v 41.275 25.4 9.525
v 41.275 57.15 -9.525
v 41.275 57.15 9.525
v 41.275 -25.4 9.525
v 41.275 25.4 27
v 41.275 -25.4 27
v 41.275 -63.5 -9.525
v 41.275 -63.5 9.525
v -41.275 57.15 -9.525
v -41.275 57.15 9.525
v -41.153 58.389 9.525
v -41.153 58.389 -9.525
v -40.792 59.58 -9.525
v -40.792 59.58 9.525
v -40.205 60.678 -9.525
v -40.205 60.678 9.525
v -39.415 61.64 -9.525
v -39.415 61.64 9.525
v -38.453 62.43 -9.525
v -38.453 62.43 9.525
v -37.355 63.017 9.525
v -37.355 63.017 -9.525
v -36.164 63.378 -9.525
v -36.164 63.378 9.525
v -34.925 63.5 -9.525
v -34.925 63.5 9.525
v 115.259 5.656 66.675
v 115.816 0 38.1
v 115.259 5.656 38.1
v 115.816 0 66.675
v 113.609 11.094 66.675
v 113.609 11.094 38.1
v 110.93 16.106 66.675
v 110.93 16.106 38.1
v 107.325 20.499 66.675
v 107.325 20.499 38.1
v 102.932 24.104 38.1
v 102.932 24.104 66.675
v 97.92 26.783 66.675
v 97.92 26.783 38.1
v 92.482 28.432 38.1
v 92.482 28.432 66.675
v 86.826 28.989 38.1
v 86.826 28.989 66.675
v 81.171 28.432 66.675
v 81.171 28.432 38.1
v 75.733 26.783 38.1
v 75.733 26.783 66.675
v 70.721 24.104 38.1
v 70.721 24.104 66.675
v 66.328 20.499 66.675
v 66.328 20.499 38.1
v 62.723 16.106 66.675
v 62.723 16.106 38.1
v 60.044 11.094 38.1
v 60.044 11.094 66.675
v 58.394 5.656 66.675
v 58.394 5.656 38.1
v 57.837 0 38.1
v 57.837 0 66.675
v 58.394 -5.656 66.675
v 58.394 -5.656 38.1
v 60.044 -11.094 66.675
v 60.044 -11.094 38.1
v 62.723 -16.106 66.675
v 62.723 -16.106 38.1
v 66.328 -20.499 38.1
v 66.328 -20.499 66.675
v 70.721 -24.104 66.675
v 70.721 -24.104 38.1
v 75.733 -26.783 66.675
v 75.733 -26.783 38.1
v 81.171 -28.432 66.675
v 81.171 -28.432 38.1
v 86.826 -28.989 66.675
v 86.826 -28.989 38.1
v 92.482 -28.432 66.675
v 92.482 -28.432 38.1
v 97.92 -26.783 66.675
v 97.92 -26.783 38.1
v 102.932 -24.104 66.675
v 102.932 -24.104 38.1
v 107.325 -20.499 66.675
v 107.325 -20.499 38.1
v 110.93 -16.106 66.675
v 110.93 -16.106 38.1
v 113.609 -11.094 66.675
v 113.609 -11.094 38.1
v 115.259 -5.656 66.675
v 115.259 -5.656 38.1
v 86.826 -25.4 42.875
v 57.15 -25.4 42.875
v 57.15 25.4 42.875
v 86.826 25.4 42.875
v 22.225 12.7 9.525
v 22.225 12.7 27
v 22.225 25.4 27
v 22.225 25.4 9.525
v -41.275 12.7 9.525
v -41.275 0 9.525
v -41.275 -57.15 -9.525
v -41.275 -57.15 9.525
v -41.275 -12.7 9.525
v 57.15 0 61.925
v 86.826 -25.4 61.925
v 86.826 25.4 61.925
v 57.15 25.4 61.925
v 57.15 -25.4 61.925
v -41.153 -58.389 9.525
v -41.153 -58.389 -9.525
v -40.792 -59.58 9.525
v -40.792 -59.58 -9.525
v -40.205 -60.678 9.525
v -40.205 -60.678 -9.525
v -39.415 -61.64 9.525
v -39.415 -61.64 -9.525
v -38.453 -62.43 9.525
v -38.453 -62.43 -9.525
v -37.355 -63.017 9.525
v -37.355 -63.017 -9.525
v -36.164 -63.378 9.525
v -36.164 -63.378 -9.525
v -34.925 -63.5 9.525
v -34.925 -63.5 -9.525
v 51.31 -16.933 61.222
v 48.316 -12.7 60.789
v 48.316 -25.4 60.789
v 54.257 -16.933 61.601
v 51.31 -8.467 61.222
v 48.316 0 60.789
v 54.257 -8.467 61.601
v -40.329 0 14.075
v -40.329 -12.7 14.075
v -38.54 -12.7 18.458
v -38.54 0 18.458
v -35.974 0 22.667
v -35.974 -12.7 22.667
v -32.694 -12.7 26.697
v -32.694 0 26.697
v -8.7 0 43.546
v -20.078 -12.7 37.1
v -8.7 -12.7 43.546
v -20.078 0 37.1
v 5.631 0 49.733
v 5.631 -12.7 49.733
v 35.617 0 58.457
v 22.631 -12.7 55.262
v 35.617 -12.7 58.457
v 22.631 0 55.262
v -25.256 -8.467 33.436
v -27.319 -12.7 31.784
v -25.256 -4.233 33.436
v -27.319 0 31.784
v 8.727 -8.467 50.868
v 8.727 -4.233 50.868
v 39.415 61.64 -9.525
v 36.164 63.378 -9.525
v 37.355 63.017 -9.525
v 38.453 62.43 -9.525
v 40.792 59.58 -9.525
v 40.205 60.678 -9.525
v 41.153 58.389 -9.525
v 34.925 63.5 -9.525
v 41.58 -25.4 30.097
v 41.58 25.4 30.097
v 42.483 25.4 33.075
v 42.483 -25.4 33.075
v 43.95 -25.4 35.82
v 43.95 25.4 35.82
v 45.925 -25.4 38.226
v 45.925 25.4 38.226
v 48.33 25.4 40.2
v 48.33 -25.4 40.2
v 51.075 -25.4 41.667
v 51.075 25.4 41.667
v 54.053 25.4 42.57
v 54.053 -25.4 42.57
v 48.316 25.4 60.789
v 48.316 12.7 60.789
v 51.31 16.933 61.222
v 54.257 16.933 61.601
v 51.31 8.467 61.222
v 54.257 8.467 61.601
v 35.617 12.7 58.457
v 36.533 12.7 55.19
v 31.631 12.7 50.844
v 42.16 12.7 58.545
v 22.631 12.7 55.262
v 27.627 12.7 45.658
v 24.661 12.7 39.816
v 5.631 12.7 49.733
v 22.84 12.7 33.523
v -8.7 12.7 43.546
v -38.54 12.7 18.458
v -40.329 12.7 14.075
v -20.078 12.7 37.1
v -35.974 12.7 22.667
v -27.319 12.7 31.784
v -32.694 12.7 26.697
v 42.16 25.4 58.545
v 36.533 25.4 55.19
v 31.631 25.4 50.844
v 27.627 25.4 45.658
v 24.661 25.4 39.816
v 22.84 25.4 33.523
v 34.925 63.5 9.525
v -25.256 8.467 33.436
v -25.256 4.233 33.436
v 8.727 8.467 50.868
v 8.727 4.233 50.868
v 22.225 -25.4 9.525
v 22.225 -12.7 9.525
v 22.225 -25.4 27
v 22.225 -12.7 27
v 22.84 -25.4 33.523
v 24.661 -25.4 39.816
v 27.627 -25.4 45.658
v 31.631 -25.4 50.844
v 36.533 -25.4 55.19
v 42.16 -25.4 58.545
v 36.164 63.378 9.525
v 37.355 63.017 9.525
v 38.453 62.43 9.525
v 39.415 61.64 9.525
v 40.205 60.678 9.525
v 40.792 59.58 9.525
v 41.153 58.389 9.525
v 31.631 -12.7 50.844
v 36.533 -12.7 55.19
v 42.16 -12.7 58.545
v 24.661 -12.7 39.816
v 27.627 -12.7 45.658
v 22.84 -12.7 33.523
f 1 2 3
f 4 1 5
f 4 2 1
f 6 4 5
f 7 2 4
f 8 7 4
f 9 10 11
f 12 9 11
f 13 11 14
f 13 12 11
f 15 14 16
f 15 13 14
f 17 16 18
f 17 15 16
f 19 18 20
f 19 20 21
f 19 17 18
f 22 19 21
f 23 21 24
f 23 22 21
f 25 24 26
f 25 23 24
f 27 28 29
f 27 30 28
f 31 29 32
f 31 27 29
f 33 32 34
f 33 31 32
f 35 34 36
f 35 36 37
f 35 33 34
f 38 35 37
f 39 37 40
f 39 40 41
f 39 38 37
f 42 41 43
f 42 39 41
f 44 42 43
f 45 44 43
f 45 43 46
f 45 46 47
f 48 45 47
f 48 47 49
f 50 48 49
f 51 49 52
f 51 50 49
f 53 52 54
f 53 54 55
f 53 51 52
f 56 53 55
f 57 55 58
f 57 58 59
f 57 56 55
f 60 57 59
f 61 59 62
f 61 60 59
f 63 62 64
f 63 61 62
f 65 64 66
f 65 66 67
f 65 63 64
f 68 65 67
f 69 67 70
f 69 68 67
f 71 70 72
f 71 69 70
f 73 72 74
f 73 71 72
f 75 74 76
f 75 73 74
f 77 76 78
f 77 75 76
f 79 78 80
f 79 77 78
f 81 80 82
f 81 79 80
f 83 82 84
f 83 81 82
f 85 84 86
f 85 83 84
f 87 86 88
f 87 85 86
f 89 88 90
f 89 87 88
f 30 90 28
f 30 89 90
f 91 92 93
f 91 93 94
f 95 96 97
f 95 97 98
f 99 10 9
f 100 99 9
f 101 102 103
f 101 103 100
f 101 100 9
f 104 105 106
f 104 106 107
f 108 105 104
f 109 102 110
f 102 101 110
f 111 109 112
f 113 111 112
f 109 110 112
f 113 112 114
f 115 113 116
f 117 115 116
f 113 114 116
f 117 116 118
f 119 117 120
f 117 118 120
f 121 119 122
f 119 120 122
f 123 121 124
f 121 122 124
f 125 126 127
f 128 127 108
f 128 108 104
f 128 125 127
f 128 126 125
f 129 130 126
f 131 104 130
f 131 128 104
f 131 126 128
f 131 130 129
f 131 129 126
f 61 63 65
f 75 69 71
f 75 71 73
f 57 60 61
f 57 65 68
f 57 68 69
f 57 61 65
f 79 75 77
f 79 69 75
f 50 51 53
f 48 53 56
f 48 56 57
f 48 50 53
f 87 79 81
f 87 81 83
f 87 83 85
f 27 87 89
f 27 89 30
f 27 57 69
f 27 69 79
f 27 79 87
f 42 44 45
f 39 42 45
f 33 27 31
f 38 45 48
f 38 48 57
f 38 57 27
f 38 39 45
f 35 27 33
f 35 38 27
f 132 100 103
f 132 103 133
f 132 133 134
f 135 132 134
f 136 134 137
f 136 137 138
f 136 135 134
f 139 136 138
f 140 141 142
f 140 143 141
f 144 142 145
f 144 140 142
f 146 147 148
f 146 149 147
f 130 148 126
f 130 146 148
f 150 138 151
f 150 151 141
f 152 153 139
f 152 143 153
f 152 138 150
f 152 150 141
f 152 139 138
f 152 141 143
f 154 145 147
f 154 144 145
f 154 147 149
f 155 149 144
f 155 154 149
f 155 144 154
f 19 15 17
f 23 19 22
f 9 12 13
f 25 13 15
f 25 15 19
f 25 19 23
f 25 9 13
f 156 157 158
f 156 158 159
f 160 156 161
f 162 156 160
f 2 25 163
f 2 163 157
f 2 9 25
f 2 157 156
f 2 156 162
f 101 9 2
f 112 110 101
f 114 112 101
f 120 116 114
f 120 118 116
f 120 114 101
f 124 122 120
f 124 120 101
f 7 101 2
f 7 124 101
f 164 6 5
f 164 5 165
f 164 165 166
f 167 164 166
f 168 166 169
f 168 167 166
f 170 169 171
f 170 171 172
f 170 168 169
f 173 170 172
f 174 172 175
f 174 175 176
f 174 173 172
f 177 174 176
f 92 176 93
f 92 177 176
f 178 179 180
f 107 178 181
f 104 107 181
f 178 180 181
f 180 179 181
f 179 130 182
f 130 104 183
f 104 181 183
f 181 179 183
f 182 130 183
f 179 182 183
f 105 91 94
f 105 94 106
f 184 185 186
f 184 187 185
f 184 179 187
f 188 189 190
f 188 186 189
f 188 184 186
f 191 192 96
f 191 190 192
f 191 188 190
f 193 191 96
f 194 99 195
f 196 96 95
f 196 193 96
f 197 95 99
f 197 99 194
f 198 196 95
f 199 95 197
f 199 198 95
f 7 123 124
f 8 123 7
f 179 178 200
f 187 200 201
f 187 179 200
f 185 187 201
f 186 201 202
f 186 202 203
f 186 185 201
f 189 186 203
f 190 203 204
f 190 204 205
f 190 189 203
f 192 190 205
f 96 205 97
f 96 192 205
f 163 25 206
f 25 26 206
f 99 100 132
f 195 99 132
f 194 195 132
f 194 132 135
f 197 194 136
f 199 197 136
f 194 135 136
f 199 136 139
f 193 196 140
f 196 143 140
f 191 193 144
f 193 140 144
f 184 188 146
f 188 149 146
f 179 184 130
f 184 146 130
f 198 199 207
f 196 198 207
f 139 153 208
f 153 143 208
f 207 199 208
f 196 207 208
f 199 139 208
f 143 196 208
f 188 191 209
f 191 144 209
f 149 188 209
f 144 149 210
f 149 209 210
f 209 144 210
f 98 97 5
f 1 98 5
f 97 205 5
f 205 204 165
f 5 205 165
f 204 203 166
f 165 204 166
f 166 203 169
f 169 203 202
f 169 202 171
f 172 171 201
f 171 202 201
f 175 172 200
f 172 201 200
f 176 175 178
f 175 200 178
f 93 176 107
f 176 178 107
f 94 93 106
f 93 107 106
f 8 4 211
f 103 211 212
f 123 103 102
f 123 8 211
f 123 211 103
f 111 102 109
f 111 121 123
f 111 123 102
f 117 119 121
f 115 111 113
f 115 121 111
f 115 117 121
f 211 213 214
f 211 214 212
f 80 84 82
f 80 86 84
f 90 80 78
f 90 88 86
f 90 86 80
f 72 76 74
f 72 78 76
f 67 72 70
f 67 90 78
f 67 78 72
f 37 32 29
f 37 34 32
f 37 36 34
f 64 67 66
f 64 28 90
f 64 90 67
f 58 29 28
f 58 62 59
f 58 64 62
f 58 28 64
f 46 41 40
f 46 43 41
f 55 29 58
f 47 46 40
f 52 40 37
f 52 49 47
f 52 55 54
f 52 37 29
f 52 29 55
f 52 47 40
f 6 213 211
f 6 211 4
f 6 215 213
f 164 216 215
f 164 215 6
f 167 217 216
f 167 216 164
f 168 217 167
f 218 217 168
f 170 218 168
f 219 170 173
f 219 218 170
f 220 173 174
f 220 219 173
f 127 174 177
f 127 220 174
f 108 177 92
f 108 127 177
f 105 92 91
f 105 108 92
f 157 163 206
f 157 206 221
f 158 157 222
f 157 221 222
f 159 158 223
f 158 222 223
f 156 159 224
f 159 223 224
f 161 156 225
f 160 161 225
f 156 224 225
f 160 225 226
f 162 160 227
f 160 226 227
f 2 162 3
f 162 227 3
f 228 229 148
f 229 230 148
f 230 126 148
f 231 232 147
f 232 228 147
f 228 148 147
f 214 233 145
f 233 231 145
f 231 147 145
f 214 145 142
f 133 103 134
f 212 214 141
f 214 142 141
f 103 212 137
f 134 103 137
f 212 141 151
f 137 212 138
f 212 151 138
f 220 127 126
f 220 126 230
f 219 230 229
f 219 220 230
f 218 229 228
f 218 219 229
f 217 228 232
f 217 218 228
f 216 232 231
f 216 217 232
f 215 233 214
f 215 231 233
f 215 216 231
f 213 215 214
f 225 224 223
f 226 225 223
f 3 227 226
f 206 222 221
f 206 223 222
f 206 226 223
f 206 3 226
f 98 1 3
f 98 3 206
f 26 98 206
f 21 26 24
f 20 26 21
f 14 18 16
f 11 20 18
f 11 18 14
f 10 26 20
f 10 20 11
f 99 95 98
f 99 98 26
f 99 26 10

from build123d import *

# Parameters (mm, degrees)
F1_DEPTH = 63.5
F0_W     = 21.8106865818
F0_H     = 19.0499988828
F2_DEPTH = 25.4
F3_DEPTH = 12.7
F5_R     = 6.35


with BuildPart() as f1:
    # F0 (on Front) → F1 (new body, symmetric)
    with BuildSketch(Plane.XZ):
        Polygon((22.2250011172, 9.525), (-41.275, 9.525), (-41.275, -9.525), (41.275, -9.525), (41.275, 9.525), align=None)
    extrude(amount=F1_DEPTH, both=True)

    # F0 (on Front) → F2 (join, symmetric)
    with BuildSketch(Plane.XZ):
        with BuildLine():
            Line((22.2250011172, 27.0002), (22.2250011172, 9.525))
            Line((22.2250011172, 9.525), (41.275, 9.525))
            Line((41.275, 9.525), (41.275, 27.0002))
            ThreePointArc((41.275, 27.0002), (45.9246798487, 38.2255201513), (57.15, 42.8752))
            Line((57.15, 42.8752), (65.0157099766, 42.8752))
            Line((65.0157099766, 42.8752), (65.0157099766, 61.9251988828))
            Line((65.0157099766, 61.9251988828), (57.15, 61.9251988828))
            add(Edge.make_bspline(
                [(48.3155460032, 60.7893694119), (51.332373107, 61.2483431533), (54.286270029, 61.6277105036), (57.15, 61.9251988828)],
                knots=[103.3574007892, 103.3574007892, 103.3574007892, 103.3574007892, 111.5045356385, 111.5045356385, 111.5045356385, 111.5045356385], degree=3))
            ThreePointArc((48.3155460032, 60.7893694119), (29.5067472705, 48.34513208), (22.2250011172, 27.0002))
        make_face()
        with Locations((75.9210532675, 52.4001994414)):
            Rectangle(F0_W, F0_H)
    extrude(amount=F2_DEPTH, both=True)

    # F0 (on Front) → F3 (join, symmetric)
    with BuildSketch(Plane.XZ):
        with BuildLine():
            add(Edge.make_bspline(
                [(-41.275, 9.525), (-38.3577020942, 36.3318382761), (10.043022736, 54.9666680795), (48.3155460032, 60.7893694119)],
                knots=[0, 0, 0, 0, 103.3574007892, 103.3574007892, 103.3574007892, 103.3574007892], degree=3))
            Line((-41.275, 9.525), (22.2250011172, 9.525))
            Line((22.2250011172, 9.525), (22.2250011172, 27.0002))
            ThreePointArc((22.2250011172, 27.0002), (29.5067472705, 48.34513208), (48.3155460032, 60.7893694119))
        make_face()
    extrude(amount=F3_DEPTH, both=True)

    # F5
    f5_edges = [f1.edges().sort_by_distance(p)[0] for p in [
        (41.275, 63.5, 0),
        (-41.275, 63.5, 0),
        (-41.275, -63.5, 0),
    ]]
    fillet(f5_edges, radius=F5_R)


with BuildPart() as f4:
    # F0 (on Front) → F4 (revolve)
    with BuildSketch(Plane.XZ):
        Polygon((86.8263965584, 66.675), (86.8263965584, 61.9251988828), (86.8263965584, 42.8752), (86.8263965584, 38.1), (115.8157099766, 38.1), (115.8157099766, 66.675), align=None)
    revolve(axis=Axis((86.8263965584, 0, 52.3875), (0, 0, 1)))


solid = Compound([f1.part, f4.part])
